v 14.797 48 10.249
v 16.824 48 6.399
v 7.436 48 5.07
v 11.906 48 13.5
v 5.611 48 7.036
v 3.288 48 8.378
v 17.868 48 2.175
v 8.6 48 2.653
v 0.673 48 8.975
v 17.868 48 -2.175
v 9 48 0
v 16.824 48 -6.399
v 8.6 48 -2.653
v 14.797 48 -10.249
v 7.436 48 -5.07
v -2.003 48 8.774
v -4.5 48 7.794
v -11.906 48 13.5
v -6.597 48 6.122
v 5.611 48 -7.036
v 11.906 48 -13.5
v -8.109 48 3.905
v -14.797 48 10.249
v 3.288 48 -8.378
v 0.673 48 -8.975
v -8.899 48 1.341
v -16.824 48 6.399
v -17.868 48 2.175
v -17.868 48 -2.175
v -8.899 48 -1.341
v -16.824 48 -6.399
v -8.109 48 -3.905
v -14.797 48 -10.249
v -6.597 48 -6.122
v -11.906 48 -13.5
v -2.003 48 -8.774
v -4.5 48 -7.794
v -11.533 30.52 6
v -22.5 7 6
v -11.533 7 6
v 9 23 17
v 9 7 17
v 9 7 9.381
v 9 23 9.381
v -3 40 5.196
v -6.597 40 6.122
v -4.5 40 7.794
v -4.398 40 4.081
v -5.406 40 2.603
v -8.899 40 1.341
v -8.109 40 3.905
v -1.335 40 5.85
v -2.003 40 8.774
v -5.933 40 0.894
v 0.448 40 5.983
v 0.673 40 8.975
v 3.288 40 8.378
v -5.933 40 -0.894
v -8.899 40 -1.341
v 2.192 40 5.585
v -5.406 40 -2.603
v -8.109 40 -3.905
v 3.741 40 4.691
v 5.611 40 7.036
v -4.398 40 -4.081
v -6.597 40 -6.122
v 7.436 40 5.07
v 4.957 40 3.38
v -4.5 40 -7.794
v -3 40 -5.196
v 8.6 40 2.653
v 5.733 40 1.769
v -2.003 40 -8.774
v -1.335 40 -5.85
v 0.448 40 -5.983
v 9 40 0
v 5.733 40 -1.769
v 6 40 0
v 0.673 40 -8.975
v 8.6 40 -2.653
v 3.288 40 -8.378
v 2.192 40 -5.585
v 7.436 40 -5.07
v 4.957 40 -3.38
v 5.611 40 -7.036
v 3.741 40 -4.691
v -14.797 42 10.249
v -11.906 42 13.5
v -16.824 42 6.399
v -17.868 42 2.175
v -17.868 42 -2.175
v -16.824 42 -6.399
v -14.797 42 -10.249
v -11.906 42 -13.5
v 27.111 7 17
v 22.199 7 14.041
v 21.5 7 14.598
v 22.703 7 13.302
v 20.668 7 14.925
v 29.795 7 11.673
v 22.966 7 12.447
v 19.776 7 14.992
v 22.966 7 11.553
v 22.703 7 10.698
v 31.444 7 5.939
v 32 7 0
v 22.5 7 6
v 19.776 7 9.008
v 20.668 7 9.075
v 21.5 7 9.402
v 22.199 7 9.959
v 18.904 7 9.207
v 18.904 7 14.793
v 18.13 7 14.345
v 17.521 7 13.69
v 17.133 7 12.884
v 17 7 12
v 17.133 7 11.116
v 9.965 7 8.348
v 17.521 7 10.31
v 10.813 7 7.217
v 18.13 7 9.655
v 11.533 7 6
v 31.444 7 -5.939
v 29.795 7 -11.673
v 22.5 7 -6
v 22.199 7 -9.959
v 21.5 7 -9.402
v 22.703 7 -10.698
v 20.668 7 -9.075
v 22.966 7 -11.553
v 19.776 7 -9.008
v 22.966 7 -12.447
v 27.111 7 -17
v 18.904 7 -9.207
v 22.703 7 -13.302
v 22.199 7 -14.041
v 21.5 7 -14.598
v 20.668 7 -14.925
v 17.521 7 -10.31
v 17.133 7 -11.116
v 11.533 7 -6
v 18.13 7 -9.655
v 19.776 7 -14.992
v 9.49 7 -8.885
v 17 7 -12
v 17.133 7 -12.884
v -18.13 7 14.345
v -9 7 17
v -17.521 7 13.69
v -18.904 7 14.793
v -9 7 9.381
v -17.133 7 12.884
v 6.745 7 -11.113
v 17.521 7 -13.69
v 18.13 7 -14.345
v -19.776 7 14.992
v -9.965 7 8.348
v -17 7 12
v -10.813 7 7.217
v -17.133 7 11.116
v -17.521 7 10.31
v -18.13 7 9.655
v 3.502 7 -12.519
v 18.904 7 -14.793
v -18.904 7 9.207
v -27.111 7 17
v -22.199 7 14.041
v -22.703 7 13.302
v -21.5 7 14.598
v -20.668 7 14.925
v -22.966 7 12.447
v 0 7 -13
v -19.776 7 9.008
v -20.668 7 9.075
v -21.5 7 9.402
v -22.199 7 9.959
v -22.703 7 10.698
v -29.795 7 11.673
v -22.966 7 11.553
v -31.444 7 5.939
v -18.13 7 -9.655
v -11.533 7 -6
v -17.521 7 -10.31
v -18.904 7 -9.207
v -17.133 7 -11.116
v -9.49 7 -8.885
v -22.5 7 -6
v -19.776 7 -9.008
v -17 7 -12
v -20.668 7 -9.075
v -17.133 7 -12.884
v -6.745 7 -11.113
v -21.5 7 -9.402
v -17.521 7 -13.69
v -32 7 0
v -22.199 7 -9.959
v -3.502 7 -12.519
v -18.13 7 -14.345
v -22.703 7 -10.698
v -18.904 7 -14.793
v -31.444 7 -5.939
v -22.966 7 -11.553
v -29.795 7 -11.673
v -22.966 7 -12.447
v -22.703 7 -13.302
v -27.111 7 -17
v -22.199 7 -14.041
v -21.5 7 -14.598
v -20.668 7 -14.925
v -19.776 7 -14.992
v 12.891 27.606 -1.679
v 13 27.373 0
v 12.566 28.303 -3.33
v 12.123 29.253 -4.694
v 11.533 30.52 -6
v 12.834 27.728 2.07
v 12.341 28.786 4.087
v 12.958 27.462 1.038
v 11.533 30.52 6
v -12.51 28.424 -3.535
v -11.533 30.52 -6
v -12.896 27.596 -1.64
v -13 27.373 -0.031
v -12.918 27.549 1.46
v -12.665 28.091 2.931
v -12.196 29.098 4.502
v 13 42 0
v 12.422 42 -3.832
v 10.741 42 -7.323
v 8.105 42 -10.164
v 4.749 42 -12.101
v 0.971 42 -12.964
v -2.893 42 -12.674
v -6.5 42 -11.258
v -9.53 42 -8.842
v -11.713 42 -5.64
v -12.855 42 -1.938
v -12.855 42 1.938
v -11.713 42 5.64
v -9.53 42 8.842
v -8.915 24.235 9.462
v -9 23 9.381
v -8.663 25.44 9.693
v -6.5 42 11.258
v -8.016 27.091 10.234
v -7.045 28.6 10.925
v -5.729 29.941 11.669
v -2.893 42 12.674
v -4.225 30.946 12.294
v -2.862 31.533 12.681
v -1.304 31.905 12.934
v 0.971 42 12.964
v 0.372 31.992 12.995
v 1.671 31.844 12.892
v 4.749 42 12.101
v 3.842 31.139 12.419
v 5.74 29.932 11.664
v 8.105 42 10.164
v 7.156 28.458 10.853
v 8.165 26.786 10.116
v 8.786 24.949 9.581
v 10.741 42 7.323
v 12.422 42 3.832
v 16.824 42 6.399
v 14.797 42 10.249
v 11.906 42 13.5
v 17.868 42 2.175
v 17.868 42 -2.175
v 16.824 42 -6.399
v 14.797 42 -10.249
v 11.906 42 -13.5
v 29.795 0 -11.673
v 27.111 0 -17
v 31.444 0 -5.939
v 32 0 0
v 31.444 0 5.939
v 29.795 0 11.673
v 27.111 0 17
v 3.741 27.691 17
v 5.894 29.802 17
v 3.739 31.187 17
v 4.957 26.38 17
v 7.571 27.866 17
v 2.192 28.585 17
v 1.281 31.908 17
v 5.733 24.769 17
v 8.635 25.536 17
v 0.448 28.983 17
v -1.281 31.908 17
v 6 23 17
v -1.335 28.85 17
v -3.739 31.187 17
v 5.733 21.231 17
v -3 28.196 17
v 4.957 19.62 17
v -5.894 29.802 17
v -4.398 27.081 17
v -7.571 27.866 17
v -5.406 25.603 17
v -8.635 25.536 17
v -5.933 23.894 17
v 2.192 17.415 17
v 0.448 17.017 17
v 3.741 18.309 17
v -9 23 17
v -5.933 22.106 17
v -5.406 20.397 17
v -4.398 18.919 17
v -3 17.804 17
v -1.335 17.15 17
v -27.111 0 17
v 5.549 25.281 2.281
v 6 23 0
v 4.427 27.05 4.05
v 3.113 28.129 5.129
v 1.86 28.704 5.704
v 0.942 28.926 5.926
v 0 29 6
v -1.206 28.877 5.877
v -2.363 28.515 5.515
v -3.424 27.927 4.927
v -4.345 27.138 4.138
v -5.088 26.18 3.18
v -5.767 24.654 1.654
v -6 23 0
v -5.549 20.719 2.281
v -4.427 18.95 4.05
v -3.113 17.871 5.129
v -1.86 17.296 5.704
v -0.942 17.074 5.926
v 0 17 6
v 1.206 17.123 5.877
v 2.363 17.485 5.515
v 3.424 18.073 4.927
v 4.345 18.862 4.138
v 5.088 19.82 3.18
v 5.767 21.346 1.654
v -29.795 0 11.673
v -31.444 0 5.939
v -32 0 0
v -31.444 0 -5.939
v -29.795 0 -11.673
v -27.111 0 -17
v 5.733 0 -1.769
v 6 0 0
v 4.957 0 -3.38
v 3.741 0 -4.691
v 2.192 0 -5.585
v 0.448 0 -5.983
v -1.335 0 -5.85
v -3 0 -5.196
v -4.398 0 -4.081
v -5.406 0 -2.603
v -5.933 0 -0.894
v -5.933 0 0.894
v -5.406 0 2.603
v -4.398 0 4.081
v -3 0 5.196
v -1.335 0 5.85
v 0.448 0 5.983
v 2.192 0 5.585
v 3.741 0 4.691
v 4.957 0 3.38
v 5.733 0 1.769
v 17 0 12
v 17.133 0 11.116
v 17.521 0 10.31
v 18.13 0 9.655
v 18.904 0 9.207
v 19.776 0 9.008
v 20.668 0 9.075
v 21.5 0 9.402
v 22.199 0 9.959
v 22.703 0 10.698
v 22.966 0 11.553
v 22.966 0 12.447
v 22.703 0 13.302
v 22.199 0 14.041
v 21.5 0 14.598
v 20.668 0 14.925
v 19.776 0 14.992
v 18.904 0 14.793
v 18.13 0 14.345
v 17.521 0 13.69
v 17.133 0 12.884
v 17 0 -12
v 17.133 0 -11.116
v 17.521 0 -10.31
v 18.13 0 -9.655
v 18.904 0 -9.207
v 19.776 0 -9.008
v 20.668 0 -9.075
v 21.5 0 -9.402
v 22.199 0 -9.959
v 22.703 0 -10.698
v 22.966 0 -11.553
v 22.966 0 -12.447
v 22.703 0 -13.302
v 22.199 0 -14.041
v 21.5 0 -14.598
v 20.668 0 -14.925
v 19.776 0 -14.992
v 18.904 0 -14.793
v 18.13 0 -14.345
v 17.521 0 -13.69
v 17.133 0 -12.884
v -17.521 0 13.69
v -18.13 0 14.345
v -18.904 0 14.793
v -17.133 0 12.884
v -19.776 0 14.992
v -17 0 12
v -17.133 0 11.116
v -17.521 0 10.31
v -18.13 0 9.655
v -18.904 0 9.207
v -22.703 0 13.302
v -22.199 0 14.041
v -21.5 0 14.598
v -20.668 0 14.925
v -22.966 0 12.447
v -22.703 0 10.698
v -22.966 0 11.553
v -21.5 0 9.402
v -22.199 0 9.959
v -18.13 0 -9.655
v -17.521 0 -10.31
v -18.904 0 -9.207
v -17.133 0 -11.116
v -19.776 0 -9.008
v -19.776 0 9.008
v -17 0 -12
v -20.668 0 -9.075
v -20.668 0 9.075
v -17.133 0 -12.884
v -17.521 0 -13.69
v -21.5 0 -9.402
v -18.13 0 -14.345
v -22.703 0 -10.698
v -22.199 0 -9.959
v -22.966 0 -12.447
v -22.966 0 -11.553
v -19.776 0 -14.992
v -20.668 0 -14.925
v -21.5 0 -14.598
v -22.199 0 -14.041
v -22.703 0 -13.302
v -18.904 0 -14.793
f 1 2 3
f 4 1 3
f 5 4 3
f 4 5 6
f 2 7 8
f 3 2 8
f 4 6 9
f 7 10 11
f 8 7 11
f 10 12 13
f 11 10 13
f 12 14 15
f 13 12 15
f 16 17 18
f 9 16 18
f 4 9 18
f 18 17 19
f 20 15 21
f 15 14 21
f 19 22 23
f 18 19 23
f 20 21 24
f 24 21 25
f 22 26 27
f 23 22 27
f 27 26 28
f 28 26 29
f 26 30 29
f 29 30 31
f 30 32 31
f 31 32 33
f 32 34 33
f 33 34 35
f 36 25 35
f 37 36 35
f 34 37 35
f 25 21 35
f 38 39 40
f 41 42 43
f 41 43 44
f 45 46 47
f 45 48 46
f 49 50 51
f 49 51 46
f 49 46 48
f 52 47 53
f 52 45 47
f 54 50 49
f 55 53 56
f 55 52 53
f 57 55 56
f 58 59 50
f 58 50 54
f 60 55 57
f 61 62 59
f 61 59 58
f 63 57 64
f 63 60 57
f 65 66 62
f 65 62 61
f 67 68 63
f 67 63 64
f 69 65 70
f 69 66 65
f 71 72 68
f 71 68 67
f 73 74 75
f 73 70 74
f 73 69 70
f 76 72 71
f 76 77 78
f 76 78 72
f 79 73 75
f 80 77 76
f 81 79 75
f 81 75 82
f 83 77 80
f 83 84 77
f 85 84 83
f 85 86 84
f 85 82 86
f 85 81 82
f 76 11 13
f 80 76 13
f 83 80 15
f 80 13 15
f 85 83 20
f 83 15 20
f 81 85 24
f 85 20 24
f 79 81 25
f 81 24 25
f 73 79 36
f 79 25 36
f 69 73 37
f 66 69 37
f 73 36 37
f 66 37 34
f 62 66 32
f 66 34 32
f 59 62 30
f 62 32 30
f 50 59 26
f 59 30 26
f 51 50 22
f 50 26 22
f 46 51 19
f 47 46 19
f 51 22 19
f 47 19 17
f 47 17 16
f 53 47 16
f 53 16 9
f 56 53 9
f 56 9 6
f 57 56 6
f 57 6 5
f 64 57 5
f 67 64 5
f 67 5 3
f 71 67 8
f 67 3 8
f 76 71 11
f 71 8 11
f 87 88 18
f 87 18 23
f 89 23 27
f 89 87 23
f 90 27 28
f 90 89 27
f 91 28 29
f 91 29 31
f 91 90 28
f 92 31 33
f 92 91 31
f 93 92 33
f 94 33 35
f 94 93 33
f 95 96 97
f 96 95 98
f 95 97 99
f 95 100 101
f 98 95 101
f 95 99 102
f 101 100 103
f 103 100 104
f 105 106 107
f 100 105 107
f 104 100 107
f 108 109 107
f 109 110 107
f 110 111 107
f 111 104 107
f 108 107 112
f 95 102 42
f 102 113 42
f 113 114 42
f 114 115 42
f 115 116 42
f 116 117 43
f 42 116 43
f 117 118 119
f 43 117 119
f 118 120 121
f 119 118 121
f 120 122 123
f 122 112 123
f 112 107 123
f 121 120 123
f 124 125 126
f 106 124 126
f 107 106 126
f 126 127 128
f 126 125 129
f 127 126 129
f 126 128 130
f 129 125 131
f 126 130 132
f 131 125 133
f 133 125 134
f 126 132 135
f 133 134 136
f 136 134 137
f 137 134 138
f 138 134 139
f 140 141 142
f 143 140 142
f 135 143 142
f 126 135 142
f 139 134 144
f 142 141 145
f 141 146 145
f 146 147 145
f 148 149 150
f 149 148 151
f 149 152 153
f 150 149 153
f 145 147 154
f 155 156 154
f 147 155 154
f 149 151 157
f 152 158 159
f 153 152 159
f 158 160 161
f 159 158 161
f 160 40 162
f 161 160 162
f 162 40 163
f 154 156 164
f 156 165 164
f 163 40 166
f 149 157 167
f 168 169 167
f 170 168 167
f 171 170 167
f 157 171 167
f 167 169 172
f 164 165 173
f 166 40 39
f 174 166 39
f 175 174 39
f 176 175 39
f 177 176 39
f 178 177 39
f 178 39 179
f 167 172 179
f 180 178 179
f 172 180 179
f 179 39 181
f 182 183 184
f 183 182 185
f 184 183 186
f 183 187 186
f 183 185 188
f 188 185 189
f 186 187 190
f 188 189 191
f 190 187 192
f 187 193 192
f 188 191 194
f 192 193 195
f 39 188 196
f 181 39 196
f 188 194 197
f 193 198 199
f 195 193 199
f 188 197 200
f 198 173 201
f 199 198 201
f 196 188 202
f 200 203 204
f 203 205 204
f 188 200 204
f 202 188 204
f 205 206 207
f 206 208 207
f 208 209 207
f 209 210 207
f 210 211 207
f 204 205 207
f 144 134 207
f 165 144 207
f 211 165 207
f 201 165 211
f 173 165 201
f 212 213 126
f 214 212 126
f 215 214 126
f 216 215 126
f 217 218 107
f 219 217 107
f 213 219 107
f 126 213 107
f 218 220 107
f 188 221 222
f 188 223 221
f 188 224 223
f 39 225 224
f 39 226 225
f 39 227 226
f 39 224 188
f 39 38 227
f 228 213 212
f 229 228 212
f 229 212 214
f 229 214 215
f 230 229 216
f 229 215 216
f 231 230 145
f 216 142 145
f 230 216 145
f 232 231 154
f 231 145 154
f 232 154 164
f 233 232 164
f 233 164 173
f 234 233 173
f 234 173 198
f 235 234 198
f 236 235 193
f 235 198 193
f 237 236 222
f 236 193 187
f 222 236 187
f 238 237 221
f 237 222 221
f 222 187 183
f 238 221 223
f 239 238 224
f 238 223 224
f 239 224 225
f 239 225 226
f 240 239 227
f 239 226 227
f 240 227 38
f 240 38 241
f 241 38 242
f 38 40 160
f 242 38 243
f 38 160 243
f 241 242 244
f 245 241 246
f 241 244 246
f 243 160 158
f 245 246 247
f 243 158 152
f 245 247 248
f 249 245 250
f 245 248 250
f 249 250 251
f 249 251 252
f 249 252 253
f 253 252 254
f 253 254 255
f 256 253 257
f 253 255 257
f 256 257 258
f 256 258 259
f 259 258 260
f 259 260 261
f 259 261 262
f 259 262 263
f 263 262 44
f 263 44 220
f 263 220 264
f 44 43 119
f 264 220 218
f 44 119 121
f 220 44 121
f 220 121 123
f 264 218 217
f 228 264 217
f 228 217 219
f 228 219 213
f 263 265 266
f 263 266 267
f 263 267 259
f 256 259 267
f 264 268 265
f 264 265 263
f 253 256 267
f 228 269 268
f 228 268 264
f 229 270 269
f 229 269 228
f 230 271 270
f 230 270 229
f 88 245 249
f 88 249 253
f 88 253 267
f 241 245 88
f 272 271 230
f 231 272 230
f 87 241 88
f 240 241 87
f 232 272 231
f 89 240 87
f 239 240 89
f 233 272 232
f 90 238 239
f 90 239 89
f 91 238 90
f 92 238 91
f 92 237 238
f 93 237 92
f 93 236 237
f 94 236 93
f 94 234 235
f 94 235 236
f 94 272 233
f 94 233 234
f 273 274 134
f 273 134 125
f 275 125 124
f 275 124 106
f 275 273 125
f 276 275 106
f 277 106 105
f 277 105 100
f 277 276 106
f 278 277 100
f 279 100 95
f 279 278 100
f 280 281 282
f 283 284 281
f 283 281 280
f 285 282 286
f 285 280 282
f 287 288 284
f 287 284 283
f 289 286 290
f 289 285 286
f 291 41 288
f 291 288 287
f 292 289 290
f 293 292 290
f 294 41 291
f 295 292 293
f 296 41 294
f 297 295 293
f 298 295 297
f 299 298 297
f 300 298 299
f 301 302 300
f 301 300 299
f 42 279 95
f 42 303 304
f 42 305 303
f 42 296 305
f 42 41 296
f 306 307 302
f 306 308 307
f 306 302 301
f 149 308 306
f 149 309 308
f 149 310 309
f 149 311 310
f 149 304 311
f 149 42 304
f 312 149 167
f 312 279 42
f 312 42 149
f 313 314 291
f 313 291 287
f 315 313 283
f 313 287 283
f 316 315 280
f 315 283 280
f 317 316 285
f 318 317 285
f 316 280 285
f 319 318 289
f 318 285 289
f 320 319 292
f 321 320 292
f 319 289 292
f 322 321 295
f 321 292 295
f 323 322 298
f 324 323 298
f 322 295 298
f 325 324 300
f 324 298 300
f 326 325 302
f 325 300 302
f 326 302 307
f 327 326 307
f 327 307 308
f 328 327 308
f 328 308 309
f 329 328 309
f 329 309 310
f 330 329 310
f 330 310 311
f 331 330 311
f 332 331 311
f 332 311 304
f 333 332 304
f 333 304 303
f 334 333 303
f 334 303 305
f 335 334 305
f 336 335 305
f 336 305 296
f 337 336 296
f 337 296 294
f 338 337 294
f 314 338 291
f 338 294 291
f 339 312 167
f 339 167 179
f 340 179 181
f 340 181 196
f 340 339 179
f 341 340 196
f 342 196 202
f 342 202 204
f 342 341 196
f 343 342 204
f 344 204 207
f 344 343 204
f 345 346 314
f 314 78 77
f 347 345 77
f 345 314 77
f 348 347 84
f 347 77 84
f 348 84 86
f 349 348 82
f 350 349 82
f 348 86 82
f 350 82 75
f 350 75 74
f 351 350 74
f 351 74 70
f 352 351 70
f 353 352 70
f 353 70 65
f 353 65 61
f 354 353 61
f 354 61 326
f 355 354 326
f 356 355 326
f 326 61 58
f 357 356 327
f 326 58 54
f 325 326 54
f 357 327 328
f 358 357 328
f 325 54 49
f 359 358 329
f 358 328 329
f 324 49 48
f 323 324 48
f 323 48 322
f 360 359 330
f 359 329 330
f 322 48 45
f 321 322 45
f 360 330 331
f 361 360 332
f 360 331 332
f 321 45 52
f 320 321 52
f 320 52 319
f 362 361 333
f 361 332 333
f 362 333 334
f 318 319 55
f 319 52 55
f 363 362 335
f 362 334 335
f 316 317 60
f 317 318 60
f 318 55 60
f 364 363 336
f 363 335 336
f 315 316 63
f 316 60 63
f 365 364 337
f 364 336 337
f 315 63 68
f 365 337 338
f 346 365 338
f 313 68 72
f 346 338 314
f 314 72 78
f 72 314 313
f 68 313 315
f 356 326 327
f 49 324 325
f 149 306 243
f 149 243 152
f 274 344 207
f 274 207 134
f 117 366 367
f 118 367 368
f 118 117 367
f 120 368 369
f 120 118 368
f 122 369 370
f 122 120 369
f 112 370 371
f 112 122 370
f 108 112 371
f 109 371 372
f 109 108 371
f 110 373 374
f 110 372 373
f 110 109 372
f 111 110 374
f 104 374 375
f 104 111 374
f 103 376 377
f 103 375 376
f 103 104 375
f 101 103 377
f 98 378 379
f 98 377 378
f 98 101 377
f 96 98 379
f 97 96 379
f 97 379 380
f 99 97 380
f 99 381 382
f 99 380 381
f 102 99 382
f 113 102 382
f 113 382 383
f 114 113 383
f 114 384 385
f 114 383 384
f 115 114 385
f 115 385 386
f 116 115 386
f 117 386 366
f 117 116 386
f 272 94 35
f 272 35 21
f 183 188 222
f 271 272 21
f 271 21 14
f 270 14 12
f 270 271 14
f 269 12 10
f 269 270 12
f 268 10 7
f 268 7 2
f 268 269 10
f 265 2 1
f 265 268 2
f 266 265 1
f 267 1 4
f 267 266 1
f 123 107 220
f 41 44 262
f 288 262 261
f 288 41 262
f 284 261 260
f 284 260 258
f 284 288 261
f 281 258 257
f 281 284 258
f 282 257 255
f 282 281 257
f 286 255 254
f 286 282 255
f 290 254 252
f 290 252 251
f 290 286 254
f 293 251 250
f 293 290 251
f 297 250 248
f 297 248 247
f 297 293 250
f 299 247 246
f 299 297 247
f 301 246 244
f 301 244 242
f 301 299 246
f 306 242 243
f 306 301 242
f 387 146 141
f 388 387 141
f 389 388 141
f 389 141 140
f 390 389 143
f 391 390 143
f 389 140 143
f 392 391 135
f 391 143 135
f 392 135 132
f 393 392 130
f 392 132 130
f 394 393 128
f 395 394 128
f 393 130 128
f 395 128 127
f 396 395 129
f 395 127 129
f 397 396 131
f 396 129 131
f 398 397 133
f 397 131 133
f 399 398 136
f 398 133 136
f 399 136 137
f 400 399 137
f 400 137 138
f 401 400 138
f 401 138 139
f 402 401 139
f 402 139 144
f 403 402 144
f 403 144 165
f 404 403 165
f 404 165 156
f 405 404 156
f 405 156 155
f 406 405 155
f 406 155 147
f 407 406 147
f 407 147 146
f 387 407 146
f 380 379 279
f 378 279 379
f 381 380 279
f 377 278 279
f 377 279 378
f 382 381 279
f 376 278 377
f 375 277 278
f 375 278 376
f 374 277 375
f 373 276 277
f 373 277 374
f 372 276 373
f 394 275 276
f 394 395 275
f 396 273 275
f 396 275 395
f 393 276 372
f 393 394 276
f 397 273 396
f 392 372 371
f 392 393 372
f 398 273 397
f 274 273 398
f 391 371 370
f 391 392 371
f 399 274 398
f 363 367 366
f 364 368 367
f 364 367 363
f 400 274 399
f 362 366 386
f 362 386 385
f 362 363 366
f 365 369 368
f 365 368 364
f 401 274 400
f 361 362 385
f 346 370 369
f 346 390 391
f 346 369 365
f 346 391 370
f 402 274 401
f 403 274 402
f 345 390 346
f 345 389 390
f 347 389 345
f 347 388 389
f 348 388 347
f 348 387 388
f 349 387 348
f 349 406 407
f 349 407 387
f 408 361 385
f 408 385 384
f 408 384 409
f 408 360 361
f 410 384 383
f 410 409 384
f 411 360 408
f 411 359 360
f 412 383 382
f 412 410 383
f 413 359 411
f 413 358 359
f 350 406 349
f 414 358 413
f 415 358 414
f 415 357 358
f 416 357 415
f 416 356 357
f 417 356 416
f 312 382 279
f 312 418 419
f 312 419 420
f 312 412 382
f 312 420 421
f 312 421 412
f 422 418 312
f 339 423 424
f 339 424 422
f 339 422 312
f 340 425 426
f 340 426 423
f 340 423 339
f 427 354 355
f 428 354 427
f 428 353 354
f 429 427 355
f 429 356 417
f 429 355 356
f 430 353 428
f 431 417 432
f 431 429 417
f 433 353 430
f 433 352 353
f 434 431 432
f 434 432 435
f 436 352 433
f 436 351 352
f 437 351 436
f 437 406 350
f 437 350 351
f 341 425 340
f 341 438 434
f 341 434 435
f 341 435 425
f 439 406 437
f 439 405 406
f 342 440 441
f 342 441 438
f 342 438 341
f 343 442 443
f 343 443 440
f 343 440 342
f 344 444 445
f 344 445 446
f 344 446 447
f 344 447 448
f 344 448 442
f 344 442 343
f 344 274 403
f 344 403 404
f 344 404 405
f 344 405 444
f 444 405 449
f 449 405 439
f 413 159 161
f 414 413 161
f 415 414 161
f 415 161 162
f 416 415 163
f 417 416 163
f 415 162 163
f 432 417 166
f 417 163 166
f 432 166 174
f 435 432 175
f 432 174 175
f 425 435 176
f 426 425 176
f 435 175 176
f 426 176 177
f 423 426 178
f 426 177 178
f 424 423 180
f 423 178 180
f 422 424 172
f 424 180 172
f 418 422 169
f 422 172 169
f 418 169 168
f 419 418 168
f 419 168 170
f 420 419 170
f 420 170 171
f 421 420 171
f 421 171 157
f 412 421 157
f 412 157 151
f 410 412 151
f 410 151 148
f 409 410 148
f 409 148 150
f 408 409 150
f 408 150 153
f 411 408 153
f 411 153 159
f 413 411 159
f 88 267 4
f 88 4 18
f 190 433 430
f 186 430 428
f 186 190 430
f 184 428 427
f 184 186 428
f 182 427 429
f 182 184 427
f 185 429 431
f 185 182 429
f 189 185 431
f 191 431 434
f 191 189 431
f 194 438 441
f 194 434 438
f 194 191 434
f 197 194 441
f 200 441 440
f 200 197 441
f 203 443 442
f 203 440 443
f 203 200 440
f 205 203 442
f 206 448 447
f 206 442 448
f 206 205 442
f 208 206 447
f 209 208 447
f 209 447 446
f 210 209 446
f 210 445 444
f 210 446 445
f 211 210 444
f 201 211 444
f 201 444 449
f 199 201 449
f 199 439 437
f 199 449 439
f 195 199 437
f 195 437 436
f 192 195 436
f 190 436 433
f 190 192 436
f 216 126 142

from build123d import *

# Parameters (mm, degrees)
EXTRUDE_1_DEPTH          = 7
SKETCH_2_R               = 3
CUT_EXTRUDE_1_DEPTH      = 8
MIRROR_2_COPY_1_SKETCH_R = 3
MIRROR_2_COPY_1_DEPTH    = 8
SKETCH_3_R               = 13
EXTRUDE_2_DEPTH          = 35
EXTRUDE_3_DEPTH          = 6
SKETCH_5_R               = 9
CUT_EXTRUDE_2_DEPTH      = 8
SKETCH_6_R               = 6
CUT_EXTRUDE_3_DEPTH      = 41
EXTRUDE_4_REACH          = 36
CUT_EXTRUDE_4_REACH      = 36
SKETCH_8_R               = 6
EXTRUDE_5_DEPTH          = 6


with BuildPart() as part:
    # 草图1 → 凸台-拉伸1 (new body)
    with BuildSketch(Plane(origin=(0, 0, 0), x_dir=(1, 0, 0), z_dir=(0, 1, 0))):
        with BuildLine():
            Line((-27.110883423, 17), (27.110883423, 17))
            ThreePointArc((27.110883423, 17), (32, 0), (27.110883423, -17))
            Line((27.110883423, -17), (-27.110883423, -17))
            ThreePointArc((-27.110883423, -17), (-32, 0), (-27.110883423, 17))
        make_face()
    extrude(amount=EXTRUDE_1_DEPTH)

    # 草图2 → 切除-拉伸1 (cut, through all)
    with BuildSketch(Plane(origin=(0, 7, 0), x_dir=(1, 0, 0), z_dir=(0, 1, 0))):
        with Locations((-20, -12)):
            Circle(SKETCH_2_R)
    cut_extrude_1 = extrude(amount=-CUT_EXTRUDE_1_DEPTH, mode=Mode.SUBTRACT)

    # 镜向1: 切除-拉伸1 across plane
    add(cut_extrude_1.mirror(Plane(origin=(0, 0, 0), x_dir=(0, 0, 1), z_dir=(1, 0, 0))), mode=Mode.SUBTRACT)

    # 镜向2: 切除-拉伸1 across plane
    add(cut_extrude_1.mirror(Plane.XY), mode=Mode.SUBTRACT)

    # 镜向2 copy 1 sketch → 镜向2 copy 1 (cut, through all)
    with BuildSketch(Plane(origin=(0, 7, 0), x_dir=(-1, 0, 0), z_dir=(0, 1, 0))):
        with Locations((-20, -12)):
            Circle(MIRROR_2_COPY_1_SKETCH_R)
    extrude(amount=-MIRROR_2_COPY_1_DEPTH, mode=Mode.SUBTRACT)

    # 草图3 → 凸台-拉伸2 (add)
    with BuildSketch(Plane(origin=(0, 7, 0), x_dir=(1, 0, 0), z_dir=(0, 1, 0))):
        Circle(SKETCH_3_R)
    extrude(amount=EXTRUDE_2_DEPTH)

    # 草图4 → 凸台-拉伸3 (add)
    with BuildSketch(Plane(origin=(0, 42, 0), x_dir=(1, 0, 0), z_dir=(0, 1, 0))):
        with BuildLine():
            Line((-11.9058809, 13.5), (11.9058809, 13.5))
            ThreePointArc((11.9058809, 13.5), (18, 0), (11.9058809, -13.5))
            Line((11.9058809, -13.5), (-11.9058809, -13.5))
            ThreePointArc((-11.9058809, -13.5), (-18, 0), (-11.9058809, 13.5))
        make_face()
    extrude(amount=EXTRUDE_3_DEPTH)

    # 草图5 → 切除-拉伸2 (cut)
    with BuildSketch(Plane(origin=(0, 48, 0), x_dir=(1, 0, 0), z_dir=(0, 1, 0))):
        Circle(SKETCH_5_R)
    extrude(amount=-CUT_EXTRUDE_2_DEPTH, mode=Mode.SUBTRACT)

    # 草图6 → 切除-拉伸3 (cut, through all)
    with BuildSketch(Plane(origin=(0, 40, 0), x_dir=(1, 0, 0), z_dir=(0, 1, 0))):
        Circle(SKETCH_6_R)
    extrude(amount=-CUT_EXTRUDE_3_DEPTH, mode=Mode.SUBTRACT)

    # 草图7 → 凸台-拉伸4 (add, up to next)
    with BuildSketch(Plane.XY.offset(17), mode=Mode.PRIVATE) as extrude_4_sk1:
        with BuildLine():
            Line((-9, 23), (-9, 0))
            Line((-9, 0), (9, 0))
            Line((9, 0), (9, 23))
            ThreePointArc((9, 23), (0, 32), (-9, 23))
        make_face()
    extrude_4_tool1 = extrude(extrude_4_sk1.sketch, amount=-EXTRUDE_4_REACH, mode=Mode.PRIVATE) - part.part
    add(extrude_4_tool1.solids().sort_by_distance((0, 15.10139, 17))[0])

    # 草图8 → 切除-拉伸4 (cut, up to next)
    with BuildSketch(Plane.XY.offset(17), mode=Mode.PRIVATE) as cut_extrude_4_sk1:
        with Locations((0, 23)):
            Circle(SKETCH_8_R)
    cut_extrude_4_tool1 = extrude(cut_extrude_4_sk1.sketch, amount=-CUT_EXTRUDE_4_REACH, mode=Mode.PRIVATE) & part.part
    add(cut_extrude_4_tool1.solids().sort_by_distance((0, 23, 17))[0], mode=Mode.SUBTRACT)

    # 草图9 → 凸台-拉伸5 (add, symmetric)
    with BuildSketch(Plane.XY):
        Polygon((-22.5, 7), (-11.086673611, 7), (-11.086673611, 31.475957428), align=None)
    extrude_5 = extrude(amount=EXTRUDE_5_DEPTH, both=True)

    # 镜向3: 凸台-拉伸5 across plane
    add(extrude_5.mirror(Plane(origin=(0, 0, 0), x_dir=(0, 0, 1), z_dir=(1, 0, 0))))


solid = part.part
